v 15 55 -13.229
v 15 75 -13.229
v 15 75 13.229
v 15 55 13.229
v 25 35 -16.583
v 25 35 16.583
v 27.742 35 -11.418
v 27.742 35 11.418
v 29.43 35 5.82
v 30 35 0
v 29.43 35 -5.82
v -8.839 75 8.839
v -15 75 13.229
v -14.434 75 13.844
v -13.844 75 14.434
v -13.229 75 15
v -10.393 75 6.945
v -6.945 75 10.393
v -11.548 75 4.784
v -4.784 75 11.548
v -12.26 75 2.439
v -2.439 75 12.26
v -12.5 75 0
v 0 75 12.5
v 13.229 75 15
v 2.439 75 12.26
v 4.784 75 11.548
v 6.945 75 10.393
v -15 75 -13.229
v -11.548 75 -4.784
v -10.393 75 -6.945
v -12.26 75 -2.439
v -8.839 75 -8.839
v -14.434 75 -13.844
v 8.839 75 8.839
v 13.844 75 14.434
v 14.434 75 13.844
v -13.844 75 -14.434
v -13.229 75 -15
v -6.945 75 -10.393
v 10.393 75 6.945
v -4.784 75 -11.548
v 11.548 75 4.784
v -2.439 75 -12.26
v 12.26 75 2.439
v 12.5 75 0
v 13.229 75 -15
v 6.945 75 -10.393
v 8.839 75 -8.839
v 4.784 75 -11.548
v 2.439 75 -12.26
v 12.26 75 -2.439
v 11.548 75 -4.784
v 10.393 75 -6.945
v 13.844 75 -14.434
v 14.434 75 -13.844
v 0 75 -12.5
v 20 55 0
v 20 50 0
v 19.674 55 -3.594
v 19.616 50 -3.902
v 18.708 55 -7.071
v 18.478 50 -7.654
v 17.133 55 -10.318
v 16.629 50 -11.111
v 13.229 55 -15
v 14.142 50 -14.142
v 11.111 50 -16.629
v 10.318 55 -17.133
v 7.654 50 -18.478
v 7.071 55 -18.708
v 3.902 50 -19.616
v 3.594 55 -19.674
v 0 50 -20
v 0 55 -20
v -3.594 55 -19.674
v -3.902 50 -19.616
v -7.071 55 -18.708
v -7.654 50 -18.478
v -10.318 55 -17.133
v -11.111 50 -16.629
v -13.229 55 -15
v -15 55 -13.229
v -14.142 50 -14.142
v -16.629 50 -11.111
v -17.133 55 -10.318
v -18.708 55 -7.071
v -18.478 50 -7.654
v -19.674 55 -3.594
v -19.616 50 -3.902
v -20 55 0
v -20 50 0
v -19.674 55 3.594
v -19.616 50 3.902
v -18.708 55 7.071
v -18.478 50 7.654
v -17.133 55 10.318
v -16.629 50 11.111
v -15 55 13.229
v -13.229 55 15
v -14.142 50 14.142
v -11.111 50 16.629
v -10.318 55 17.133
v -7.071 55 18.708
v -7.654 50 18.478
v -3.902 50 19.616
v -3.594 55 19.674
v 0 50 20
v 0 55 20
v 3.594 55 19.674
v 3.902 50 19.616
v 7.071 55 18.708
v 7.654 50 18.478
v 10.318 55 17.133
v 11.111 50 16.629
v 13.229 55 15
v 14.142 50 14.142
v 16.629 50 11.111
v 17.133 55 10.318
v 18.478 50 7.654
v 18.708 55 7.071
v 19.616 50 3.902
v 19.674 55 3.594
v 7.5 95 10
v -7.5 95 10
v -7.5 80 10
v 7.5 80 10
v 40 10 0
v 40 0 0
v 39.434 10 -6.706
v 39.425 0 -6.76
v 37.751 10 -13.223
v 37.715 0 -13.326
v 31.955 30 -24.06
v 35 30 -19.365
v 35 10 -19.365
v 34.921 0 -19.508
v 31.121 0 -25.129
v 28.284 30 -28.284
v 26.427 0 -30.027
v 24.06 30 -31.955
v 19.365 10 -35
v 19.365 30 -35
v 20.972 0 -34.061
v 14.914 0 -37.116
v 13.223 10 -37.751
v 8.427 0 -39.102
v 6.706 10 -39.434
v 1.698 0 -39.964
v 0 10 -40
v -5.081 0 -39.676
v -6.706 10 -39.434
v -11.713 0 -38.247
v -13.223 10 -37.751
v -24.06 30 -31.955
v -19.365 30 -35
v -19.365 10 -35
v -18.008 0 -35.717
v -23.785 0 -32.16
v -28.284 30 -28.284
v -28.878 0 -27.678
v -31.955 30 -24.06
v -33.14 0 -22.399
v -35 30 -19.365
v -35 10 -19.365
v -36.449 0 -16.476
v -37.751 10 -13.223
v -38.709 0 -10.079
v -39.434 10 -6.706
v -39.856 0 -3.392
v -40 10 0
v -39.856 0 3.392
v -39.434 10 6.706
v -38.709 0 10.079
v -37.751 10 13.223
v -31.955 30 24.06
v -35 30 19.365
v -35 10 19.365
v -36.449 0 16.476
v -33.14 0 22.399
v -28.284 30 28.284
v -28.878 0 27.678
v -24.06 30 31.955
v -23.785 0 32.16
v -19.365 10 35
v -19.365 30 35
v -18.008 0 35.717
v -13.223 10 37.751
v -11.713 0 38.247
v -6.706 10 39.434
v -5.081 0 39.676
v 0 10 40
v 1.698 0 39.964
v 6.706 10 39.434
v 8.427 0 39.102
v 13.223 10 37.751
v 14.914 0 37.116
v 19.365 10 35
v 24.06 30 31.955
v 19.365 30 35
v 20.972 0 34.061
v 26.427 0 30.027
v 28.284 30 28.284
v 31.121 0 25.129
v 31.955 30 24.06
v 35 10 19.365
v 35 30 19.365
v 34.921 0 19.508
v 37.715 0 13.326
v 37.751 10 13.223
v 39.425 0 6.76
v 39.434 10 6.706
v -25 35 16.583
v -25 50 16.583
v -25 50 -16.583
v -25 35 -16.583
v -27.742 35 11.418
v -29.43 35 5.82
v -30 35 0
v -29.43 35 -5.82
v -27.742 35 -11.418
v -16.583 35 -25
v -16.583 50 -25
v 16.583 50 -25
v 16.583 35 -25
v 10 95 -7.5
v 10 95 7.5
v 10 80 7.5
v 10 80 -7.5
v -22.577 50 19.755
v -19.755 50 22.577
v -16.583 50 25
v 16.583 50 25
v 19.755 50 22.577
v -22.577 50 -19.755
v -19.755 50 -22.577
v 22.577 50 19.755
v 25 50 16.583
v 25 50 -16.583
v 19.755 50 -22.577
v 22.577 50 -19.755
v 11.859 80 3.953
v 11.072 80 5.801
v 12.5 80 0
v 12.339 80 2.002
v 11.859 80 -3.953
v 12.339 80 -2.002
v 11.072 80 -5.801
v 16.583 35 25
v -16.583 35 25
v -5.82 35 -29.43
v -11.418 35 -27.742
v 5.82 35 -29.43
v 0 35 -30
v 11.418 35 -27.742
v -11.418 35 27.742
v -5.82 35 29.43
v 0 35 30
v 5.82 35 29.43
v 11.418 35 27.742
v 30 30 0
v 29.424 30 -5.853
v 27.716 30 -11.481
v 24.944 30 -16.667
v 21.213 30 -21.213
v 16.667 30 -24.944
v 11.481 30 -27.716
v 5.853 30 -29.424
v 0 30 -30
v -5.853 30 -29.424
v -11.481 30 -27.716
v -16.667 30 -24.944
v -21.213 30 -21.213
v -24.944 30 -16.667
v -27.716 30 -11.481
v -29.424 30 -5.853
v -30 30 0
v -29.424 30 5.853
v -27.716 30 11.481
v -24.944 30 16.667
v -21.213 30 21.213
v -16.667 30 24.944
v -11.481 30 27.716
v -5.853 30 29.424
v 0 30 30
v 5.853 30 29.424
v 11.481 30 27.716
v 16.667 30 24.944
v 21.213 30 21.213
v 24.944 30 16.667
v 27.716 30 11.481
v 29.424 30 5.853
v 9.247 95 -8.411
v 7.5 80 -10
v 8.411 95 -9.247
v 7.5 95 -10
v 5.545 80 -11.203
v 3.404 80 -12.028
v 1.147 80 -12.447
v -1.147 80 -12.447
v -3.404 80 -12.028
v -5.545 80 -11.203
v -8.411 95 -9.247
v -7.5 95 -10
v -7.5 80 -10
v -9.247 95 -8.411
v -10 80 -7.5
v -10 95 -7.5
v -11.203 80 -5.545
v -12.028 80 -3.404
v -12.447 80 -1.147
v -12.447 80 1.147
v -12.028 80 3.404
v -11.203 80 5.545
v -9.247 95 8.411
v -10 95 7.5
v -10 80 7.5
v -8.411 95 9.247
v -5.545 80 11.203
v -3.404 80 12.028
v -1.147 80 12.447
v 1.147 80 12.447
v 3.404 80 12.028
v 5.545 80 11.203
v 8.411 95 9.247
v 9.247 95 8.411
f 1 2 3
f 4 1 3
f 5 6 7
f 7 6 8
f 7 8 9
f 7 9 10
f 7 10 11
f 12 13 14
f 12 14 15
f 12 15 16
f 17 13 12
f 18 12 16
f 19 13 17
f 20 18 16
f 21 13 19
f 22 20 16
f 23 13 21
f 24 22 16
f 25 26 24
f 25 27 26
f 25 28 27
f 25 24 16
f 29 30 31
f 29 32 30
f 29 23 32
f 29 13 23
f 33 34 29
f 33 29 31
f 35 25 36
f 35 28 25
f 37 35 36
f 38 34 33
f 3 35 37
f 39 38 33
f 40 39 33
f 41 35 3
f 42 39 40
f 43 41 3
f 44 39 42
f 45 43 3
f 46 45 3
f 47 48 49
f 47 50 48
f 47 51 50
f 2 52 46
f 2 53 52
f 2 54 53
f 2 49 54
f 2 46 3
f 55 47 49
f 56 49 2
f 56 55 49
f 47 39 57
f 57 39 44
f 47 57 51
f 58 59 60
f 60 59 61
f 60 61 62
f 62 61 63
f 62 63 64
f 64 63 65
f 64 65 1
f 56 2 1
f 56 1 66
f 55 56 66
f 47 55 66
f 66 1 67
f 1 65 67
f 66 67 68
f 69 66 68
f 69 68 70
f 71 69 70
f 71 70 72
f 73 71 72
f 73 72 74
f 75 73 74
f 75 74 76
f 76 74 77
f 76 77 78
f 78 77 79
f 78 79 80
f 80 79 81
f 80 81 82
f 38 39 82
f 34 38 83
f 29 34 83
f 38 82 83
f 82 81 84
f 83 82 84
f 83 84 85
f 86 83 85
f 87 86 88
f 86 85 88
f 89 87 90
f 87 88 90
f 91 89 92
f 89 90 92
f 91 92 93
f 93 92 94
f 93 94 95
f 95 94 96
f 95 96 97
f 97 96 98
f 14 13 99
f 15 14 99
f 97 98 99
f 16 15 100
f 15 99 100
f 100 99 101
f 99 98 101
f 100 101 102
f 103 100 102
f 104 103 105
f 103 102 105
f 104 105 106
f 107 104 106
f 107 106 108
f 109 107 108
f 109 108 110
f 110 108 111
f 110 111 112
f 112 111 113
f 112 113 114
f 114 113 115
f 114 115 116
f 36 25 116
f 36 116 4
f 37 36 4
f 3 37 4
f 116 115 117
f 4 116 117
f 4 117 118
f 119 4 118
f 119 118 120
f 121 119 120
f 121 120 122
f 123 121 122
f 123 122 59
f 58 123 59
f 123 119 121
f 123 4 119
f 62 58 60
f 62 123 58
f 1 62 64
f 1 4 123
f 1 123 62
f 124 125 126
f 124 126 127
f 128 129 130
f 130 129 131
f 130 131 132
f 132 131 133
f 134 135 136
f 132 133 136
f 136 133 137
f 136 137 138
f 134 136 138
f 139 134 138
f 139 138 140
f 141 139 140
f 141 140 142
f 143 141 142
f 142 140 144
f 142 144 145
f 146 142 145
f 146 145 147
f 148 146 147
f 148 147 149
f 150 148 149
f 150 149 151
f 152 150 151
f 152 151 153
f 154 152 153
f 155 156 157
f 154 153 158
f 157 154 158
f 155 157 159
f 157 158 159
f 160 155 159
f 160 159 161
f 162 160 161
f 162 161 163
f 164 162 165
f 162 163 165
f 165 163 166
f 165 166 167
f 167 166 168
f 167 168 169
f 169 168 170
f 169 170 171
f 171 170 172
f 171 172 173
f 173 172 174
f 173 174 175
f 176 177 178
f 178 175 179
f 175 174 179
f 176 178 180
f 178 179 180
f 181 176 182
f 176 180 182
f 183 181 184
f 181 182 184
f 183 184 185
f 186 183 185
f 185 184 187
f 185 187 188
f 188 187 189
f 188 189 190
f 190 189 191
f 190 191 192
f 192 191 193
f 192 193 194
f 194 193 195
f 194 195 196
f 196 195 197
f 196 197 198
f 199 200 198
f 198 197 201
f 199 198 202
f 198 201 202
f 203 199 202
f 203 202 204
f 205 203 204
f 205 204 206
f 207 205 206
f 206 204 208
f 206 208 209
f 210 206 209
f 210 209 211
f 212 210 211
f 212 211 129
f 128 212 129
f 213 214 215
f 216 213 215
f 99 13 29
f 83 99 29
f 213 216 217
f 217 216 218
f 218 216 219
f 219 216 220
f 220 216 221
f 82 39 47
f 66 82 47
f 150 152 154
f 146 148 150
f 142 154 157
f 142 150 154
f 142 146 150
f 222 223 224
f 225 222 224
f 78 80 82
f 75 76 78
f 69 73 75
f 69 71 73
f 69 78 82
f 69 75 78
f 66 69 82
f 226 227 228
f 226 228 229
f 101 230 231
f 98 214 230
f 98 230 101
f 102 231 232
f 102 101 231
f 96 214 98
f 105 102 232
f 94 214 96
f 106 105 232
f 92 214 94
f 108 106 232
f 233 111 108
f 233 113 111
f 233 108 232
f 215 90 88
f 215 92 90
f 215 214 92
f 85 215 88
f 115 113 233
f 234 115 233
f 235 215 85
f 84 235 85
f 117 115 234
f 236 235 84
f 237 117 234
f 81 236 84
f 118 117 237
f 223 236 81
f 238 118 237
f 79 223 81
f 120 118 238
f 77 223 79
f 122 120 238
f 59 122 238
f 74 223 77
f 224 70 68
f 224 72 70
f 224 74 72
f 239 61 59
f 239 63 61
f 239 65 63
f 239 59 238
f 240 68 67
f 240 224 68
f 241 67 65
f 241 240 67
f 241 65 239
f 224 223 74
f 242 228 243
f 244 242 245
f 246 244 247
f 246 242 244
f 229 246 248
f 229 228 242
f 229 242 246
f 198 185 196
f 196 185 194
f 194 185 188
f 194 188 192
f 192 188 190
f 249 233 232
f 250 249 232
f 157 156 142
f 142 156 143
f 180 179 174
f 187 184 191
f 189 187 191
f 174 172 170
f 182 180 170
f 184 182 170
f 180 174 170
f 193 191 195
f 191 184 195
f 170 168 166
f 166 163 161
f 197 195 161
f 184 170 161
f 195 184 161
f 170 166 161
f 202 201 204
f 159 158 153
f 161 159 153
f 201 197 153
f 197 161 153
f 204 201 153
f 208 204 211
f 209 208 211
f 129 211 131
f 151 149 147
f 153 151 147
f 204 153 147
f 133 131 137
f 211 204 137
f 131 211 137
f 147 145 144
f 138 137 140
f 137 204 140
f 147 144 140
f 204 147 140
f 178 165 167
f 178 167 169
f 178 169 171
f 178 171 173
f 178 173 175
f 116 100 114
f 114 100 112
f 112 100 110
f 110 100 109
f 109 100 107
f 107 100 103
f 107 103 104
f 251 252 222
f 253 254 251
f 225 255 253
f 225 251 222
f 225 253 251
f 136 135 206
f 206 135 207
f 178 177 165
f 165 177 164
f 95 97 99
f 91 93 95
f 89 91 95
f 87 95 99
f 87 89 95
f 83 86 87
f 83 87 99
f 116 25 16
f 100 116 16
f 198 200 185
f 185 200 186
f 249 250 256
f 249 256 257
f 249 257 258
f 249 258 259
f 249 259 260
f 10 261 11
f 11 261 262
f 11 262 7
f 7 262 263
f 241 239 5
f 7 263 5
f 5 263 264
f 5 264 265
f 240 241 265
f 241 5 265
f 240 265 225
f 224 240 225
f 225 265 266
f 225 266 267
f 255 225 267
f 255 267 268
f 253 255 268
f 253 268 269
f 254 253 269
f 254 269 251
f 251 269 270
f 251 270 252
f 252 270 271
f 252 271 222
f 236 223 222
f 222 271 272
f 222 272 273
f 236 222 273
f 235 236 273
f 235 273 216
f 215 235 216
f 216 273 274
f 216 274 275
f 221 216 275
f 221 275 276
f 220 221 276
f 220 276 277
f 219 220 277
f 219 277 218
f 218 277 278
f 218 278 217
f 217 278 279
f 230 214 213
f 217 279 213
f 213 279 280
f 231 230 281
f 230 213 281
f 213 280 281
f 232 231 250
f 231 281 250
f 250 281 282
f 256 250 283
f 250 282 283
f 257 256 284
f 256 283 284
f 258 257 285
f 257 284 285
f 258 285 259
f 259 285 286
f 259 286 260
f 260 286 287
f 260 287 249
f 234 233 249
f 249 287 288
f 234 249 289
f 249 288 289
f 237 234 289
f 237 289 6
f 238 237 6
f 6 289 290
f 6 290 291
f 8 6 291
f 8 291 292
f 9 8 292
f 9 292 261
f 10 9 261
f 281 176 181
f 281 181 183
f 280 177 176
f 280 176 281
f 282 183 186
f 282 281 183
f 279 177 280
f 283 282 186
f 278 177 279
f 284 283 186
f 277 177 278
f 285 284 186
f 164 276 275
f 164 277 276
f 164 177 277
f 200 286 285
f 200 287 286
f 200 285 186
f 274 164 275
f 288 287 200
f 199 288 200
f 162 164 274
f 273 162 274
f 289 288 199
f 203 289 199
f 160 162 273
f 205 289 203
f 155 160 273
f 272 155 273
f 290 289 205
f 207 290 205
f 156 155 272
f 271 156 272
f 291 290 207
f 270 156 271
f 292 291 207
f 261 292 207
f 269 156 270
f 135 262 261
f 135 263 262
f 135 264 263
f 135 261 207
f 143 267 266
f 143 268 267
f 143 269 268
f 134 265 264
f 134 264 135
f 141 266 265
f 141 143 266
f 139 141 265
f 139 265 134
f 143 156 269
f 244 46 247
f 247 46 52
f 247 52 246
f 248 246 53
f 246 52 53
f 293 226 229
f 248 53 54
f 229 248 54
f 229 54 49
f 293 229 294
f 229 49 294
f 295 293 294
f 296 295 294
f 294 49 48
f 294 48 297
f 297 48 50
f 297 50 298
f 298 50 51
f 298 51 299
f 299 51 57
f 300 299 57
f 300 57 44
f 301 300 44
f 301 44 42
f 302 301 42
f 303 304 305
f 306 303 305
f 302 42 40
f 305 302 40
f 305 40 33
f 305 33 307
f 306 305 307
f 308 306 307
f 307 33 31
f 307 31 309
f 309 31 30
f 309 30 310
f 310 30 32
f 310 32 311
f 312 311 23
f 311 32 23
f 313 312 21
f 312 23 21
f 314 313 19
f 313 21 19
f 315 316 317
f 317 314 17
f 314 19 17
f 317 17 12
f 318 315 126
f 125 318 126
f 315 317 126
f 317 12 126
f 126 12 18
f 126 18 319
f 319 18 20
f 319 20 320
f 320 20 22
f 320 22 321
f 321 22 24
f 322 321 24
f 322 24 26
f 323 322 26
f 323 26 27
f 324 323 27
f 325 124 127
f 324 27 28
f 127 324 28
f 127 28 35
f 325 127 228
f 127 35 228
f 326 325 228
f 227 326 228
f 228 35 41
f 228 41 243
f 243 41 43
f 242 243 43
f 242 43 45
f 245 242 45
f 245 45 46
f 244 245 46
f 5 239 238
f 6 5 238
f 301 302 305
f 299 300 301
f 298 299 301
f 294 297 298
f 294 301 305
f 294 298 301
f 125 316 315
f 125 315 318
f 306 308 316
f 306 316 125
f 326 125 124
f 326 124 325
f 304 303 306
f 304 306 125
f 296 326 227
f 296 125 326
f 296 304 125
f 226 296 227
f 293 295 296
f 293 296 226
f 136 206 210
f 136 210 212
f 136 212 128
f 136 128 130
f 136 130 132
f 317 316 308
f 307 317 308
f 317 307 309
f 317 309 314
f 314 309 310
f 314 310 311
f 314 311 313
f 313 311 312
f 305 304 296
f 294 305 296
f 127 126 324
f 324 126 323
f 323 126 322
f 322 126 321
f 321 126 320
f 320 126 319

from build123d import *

# Parameters (mm, degrees)
SKETCH1_R           = 40
BOSS_EXTRUDE1_DEPTH = 30
SKETCH2_R           = 30
BOSS_EXTRUDE2_DEPTH = 20
SKETCH3_R           = 20
BOSS_EXTRUDE3_DEPTH = 25
SKETCH4_R           = 12.5
BOSS_EXTRUDE4_DEPTH = 20
SKETCH5_OUTSIDE_W   = 111.546
SKETCH5_OUTSIDE_H   = 111.546
SKETCH5_OUTSIDE_W_2 = 20
SKETCH5_OUTSIDE_H_2 = 20
CUT_EXTRUDE2_DEPTH  = 15
CUT_EXTRUDE7_DEPTH  = 20
CUT_EXTRUDE8_START  = 50
CUT_EXTRUDE8_DEPTH  = 15
CUT_EXTRUDE9_DEPTH  = 20


with BuildPart() as part:
    # Sketch1 → Boss-Extrude1 (new body)
    with BuildSketch(Plane(origin=(0, 0, 0), x_dir=(1, 0, 0), z_dir=(0, 1, 0))):
        Circle(SKETCH1_R)
    extrude(amount=BOSS_EXTRUDE1_DEPTH)

    # Sketch2 → Boss-Extrude2 (add)
    with BuildSketch(Plane(origin=(0, 30, 0), x_dir=(1, 0, 0), z_dir=(0, 1, 0))):
        Circle(SKETCH2_R)
    extrude(amount=BOSS_EXTRUDE2_DEPTH)

    # Sketch3 → Boss-Extrude3 (add)
    with BuildSketch(Plane(origin=(0, 50, 0), x_dir=(1, 0, 0), z_dir=(0, 1, 0))):
        Circle(SKETCH3_R)
    extrude(amount=BOSS_EXTRUDE3_DEPTH)

    # Sketch4 → Boss-Extrude4 (add)
    with BuildSketch(Plane(origin=(0, 75, 0), x_dir=(1, 0, 0), z_dir=(0, 1, 0))):
        Circle(SKETCH4_R)
    extrude(amount=BOSS_EXTRUDE4_DEPTH)

    # Sketch5 outside → Cut-Extrude2 (cut)
    with BuildSketch(Plane(origin=(0, 95, 0), x_dir=(1, 0, 0), z_dir=(0, 1, 0))):
        Rectangle(SKETCH5_OUTSIDE_W, SKETCH5_OUTSIDE_H)
        Rectangle(SKETCH5_OUTSIDE_W_2, SKETCH5_OUTSIDE_H_2, mode=Mode.SUBTRACT)
    extrude(amount=-CUT_EXTRUDE2_DEPTH, mode=Mode.SUBTRACT)

    # Sketch6 → Cut-Extrude7 (cut)
    with BuildSketch(Plane(origin=(0, 75, 0), x_dir=(1, 0, 0), z_dir=(0, 1, 0))):
        Polygon((-5.77591504, 20.949618127), (-15, 15), (15, 15), (14.22408496, 20.949618127), align=None)
        Polygon((-15, -15), (-15, 15), (-20.949618127, 14.22408496), (-20.949618127, -5.77591504), align=None)
        Polygon((20.949618127, 5.77591504), (15, 15), (15, -15), (20.949618127, -14.22408496), align=None)
        Polygon((15, -15), (-15, -15), (-14.22408496, -20.949618127), (5.77591504, -20.949618127), align=None)
    extrude(amount=-CUT_EXTRUDE7_DEPTH, mode=Mode.SUBTRACT)

    # Sketch7 → Cut-Extrude8 (cut)
    with BuildSketch(Plane(origin=(0, 0, 0), x_dir=(1, 0, 0), z_dir=(0, 1, 0)).offset(CUT_EXTRUDE8_START)):
        with BuildLine():
            Line((-24.918588748, 25), (24.918588748, 25))
            ThreePointArc((24.918588748, 25), (0, 35.297819553), (-24.918588748, 25))
        make_face()
        with BuildLine():
            Line((25, 24.918588748), (25, -24.918588748))
            ThreePointArc((25, -24.918588748), (35.297819553, 0), (25, 24.918588748))
        make_face()
        with BuildLine():
            Line((24.918588748, -25), (-24.918588748, -25))
            ThreePointArc((-24.918588748, -25), (0, -35.297819553), (24.918588748, -25))
        make_face()
        with BuildLine():
            Line((-25, -24.918588748), (-25, 24.918588748))
            ThreePointArc((-25, 24.918588748), (-35.297819553, 0), (-25, -24.918588748))
        make_face()
    extrude(amount=-CUT_EXTRUDE8_DEPTH, mode=Mode.SUBTRACT)

    # Sketch8 → Cut-Extrude9 (cut)
    with BuildSketch(Plane(origin=(0, 30, 0), x_dir=(1, 0, 0), z_dir=(0, 1, 0))):
        with BuildLine():
            Line((-35, 35.707142143), (-35, 35))
            Line((-35, 35), (35, 35))
            Line((35, 35), (35, 35.707142143))
            ThreePointArc((35, 35.707142143), (0, 50), (-35, 35.707142143))
        make_face()
        with BuildLine():
            Line((-35, 35), (-35.707142143, 35))
            ThreePointArc((-35.707142143, 35), (-50, 0), (-35.707142143, -35))
            Line((-35.707142143, -35), (-35, -35))
            Line((-35, -35), (-35, 35))
        make_face()
        with BuildLine():
            Line((35.707142143, 35), (35, 35))
            Line((35, 35), (35, -35))
            Line((35, -35), (35.707142143, -35))
            ThreePointArc((35.707142143, -35), (50, 0), (35.707142143, 35))
        make_face()
        with BuildLine():
            Line((35, -35), (-35, -35))
            Line((-35, -35), (-35, -35.707142143))
            ThreePointArc((-35, -35.707142143), (0, -50), (35, -35.707142143))
            Line((35, -35.707142143), (35, -35))
        make_face()
    extrude(amount=-CUT_EXTRUDE9_DEPTH, mode=Mode.SUBTRACT)


solid = part.part
